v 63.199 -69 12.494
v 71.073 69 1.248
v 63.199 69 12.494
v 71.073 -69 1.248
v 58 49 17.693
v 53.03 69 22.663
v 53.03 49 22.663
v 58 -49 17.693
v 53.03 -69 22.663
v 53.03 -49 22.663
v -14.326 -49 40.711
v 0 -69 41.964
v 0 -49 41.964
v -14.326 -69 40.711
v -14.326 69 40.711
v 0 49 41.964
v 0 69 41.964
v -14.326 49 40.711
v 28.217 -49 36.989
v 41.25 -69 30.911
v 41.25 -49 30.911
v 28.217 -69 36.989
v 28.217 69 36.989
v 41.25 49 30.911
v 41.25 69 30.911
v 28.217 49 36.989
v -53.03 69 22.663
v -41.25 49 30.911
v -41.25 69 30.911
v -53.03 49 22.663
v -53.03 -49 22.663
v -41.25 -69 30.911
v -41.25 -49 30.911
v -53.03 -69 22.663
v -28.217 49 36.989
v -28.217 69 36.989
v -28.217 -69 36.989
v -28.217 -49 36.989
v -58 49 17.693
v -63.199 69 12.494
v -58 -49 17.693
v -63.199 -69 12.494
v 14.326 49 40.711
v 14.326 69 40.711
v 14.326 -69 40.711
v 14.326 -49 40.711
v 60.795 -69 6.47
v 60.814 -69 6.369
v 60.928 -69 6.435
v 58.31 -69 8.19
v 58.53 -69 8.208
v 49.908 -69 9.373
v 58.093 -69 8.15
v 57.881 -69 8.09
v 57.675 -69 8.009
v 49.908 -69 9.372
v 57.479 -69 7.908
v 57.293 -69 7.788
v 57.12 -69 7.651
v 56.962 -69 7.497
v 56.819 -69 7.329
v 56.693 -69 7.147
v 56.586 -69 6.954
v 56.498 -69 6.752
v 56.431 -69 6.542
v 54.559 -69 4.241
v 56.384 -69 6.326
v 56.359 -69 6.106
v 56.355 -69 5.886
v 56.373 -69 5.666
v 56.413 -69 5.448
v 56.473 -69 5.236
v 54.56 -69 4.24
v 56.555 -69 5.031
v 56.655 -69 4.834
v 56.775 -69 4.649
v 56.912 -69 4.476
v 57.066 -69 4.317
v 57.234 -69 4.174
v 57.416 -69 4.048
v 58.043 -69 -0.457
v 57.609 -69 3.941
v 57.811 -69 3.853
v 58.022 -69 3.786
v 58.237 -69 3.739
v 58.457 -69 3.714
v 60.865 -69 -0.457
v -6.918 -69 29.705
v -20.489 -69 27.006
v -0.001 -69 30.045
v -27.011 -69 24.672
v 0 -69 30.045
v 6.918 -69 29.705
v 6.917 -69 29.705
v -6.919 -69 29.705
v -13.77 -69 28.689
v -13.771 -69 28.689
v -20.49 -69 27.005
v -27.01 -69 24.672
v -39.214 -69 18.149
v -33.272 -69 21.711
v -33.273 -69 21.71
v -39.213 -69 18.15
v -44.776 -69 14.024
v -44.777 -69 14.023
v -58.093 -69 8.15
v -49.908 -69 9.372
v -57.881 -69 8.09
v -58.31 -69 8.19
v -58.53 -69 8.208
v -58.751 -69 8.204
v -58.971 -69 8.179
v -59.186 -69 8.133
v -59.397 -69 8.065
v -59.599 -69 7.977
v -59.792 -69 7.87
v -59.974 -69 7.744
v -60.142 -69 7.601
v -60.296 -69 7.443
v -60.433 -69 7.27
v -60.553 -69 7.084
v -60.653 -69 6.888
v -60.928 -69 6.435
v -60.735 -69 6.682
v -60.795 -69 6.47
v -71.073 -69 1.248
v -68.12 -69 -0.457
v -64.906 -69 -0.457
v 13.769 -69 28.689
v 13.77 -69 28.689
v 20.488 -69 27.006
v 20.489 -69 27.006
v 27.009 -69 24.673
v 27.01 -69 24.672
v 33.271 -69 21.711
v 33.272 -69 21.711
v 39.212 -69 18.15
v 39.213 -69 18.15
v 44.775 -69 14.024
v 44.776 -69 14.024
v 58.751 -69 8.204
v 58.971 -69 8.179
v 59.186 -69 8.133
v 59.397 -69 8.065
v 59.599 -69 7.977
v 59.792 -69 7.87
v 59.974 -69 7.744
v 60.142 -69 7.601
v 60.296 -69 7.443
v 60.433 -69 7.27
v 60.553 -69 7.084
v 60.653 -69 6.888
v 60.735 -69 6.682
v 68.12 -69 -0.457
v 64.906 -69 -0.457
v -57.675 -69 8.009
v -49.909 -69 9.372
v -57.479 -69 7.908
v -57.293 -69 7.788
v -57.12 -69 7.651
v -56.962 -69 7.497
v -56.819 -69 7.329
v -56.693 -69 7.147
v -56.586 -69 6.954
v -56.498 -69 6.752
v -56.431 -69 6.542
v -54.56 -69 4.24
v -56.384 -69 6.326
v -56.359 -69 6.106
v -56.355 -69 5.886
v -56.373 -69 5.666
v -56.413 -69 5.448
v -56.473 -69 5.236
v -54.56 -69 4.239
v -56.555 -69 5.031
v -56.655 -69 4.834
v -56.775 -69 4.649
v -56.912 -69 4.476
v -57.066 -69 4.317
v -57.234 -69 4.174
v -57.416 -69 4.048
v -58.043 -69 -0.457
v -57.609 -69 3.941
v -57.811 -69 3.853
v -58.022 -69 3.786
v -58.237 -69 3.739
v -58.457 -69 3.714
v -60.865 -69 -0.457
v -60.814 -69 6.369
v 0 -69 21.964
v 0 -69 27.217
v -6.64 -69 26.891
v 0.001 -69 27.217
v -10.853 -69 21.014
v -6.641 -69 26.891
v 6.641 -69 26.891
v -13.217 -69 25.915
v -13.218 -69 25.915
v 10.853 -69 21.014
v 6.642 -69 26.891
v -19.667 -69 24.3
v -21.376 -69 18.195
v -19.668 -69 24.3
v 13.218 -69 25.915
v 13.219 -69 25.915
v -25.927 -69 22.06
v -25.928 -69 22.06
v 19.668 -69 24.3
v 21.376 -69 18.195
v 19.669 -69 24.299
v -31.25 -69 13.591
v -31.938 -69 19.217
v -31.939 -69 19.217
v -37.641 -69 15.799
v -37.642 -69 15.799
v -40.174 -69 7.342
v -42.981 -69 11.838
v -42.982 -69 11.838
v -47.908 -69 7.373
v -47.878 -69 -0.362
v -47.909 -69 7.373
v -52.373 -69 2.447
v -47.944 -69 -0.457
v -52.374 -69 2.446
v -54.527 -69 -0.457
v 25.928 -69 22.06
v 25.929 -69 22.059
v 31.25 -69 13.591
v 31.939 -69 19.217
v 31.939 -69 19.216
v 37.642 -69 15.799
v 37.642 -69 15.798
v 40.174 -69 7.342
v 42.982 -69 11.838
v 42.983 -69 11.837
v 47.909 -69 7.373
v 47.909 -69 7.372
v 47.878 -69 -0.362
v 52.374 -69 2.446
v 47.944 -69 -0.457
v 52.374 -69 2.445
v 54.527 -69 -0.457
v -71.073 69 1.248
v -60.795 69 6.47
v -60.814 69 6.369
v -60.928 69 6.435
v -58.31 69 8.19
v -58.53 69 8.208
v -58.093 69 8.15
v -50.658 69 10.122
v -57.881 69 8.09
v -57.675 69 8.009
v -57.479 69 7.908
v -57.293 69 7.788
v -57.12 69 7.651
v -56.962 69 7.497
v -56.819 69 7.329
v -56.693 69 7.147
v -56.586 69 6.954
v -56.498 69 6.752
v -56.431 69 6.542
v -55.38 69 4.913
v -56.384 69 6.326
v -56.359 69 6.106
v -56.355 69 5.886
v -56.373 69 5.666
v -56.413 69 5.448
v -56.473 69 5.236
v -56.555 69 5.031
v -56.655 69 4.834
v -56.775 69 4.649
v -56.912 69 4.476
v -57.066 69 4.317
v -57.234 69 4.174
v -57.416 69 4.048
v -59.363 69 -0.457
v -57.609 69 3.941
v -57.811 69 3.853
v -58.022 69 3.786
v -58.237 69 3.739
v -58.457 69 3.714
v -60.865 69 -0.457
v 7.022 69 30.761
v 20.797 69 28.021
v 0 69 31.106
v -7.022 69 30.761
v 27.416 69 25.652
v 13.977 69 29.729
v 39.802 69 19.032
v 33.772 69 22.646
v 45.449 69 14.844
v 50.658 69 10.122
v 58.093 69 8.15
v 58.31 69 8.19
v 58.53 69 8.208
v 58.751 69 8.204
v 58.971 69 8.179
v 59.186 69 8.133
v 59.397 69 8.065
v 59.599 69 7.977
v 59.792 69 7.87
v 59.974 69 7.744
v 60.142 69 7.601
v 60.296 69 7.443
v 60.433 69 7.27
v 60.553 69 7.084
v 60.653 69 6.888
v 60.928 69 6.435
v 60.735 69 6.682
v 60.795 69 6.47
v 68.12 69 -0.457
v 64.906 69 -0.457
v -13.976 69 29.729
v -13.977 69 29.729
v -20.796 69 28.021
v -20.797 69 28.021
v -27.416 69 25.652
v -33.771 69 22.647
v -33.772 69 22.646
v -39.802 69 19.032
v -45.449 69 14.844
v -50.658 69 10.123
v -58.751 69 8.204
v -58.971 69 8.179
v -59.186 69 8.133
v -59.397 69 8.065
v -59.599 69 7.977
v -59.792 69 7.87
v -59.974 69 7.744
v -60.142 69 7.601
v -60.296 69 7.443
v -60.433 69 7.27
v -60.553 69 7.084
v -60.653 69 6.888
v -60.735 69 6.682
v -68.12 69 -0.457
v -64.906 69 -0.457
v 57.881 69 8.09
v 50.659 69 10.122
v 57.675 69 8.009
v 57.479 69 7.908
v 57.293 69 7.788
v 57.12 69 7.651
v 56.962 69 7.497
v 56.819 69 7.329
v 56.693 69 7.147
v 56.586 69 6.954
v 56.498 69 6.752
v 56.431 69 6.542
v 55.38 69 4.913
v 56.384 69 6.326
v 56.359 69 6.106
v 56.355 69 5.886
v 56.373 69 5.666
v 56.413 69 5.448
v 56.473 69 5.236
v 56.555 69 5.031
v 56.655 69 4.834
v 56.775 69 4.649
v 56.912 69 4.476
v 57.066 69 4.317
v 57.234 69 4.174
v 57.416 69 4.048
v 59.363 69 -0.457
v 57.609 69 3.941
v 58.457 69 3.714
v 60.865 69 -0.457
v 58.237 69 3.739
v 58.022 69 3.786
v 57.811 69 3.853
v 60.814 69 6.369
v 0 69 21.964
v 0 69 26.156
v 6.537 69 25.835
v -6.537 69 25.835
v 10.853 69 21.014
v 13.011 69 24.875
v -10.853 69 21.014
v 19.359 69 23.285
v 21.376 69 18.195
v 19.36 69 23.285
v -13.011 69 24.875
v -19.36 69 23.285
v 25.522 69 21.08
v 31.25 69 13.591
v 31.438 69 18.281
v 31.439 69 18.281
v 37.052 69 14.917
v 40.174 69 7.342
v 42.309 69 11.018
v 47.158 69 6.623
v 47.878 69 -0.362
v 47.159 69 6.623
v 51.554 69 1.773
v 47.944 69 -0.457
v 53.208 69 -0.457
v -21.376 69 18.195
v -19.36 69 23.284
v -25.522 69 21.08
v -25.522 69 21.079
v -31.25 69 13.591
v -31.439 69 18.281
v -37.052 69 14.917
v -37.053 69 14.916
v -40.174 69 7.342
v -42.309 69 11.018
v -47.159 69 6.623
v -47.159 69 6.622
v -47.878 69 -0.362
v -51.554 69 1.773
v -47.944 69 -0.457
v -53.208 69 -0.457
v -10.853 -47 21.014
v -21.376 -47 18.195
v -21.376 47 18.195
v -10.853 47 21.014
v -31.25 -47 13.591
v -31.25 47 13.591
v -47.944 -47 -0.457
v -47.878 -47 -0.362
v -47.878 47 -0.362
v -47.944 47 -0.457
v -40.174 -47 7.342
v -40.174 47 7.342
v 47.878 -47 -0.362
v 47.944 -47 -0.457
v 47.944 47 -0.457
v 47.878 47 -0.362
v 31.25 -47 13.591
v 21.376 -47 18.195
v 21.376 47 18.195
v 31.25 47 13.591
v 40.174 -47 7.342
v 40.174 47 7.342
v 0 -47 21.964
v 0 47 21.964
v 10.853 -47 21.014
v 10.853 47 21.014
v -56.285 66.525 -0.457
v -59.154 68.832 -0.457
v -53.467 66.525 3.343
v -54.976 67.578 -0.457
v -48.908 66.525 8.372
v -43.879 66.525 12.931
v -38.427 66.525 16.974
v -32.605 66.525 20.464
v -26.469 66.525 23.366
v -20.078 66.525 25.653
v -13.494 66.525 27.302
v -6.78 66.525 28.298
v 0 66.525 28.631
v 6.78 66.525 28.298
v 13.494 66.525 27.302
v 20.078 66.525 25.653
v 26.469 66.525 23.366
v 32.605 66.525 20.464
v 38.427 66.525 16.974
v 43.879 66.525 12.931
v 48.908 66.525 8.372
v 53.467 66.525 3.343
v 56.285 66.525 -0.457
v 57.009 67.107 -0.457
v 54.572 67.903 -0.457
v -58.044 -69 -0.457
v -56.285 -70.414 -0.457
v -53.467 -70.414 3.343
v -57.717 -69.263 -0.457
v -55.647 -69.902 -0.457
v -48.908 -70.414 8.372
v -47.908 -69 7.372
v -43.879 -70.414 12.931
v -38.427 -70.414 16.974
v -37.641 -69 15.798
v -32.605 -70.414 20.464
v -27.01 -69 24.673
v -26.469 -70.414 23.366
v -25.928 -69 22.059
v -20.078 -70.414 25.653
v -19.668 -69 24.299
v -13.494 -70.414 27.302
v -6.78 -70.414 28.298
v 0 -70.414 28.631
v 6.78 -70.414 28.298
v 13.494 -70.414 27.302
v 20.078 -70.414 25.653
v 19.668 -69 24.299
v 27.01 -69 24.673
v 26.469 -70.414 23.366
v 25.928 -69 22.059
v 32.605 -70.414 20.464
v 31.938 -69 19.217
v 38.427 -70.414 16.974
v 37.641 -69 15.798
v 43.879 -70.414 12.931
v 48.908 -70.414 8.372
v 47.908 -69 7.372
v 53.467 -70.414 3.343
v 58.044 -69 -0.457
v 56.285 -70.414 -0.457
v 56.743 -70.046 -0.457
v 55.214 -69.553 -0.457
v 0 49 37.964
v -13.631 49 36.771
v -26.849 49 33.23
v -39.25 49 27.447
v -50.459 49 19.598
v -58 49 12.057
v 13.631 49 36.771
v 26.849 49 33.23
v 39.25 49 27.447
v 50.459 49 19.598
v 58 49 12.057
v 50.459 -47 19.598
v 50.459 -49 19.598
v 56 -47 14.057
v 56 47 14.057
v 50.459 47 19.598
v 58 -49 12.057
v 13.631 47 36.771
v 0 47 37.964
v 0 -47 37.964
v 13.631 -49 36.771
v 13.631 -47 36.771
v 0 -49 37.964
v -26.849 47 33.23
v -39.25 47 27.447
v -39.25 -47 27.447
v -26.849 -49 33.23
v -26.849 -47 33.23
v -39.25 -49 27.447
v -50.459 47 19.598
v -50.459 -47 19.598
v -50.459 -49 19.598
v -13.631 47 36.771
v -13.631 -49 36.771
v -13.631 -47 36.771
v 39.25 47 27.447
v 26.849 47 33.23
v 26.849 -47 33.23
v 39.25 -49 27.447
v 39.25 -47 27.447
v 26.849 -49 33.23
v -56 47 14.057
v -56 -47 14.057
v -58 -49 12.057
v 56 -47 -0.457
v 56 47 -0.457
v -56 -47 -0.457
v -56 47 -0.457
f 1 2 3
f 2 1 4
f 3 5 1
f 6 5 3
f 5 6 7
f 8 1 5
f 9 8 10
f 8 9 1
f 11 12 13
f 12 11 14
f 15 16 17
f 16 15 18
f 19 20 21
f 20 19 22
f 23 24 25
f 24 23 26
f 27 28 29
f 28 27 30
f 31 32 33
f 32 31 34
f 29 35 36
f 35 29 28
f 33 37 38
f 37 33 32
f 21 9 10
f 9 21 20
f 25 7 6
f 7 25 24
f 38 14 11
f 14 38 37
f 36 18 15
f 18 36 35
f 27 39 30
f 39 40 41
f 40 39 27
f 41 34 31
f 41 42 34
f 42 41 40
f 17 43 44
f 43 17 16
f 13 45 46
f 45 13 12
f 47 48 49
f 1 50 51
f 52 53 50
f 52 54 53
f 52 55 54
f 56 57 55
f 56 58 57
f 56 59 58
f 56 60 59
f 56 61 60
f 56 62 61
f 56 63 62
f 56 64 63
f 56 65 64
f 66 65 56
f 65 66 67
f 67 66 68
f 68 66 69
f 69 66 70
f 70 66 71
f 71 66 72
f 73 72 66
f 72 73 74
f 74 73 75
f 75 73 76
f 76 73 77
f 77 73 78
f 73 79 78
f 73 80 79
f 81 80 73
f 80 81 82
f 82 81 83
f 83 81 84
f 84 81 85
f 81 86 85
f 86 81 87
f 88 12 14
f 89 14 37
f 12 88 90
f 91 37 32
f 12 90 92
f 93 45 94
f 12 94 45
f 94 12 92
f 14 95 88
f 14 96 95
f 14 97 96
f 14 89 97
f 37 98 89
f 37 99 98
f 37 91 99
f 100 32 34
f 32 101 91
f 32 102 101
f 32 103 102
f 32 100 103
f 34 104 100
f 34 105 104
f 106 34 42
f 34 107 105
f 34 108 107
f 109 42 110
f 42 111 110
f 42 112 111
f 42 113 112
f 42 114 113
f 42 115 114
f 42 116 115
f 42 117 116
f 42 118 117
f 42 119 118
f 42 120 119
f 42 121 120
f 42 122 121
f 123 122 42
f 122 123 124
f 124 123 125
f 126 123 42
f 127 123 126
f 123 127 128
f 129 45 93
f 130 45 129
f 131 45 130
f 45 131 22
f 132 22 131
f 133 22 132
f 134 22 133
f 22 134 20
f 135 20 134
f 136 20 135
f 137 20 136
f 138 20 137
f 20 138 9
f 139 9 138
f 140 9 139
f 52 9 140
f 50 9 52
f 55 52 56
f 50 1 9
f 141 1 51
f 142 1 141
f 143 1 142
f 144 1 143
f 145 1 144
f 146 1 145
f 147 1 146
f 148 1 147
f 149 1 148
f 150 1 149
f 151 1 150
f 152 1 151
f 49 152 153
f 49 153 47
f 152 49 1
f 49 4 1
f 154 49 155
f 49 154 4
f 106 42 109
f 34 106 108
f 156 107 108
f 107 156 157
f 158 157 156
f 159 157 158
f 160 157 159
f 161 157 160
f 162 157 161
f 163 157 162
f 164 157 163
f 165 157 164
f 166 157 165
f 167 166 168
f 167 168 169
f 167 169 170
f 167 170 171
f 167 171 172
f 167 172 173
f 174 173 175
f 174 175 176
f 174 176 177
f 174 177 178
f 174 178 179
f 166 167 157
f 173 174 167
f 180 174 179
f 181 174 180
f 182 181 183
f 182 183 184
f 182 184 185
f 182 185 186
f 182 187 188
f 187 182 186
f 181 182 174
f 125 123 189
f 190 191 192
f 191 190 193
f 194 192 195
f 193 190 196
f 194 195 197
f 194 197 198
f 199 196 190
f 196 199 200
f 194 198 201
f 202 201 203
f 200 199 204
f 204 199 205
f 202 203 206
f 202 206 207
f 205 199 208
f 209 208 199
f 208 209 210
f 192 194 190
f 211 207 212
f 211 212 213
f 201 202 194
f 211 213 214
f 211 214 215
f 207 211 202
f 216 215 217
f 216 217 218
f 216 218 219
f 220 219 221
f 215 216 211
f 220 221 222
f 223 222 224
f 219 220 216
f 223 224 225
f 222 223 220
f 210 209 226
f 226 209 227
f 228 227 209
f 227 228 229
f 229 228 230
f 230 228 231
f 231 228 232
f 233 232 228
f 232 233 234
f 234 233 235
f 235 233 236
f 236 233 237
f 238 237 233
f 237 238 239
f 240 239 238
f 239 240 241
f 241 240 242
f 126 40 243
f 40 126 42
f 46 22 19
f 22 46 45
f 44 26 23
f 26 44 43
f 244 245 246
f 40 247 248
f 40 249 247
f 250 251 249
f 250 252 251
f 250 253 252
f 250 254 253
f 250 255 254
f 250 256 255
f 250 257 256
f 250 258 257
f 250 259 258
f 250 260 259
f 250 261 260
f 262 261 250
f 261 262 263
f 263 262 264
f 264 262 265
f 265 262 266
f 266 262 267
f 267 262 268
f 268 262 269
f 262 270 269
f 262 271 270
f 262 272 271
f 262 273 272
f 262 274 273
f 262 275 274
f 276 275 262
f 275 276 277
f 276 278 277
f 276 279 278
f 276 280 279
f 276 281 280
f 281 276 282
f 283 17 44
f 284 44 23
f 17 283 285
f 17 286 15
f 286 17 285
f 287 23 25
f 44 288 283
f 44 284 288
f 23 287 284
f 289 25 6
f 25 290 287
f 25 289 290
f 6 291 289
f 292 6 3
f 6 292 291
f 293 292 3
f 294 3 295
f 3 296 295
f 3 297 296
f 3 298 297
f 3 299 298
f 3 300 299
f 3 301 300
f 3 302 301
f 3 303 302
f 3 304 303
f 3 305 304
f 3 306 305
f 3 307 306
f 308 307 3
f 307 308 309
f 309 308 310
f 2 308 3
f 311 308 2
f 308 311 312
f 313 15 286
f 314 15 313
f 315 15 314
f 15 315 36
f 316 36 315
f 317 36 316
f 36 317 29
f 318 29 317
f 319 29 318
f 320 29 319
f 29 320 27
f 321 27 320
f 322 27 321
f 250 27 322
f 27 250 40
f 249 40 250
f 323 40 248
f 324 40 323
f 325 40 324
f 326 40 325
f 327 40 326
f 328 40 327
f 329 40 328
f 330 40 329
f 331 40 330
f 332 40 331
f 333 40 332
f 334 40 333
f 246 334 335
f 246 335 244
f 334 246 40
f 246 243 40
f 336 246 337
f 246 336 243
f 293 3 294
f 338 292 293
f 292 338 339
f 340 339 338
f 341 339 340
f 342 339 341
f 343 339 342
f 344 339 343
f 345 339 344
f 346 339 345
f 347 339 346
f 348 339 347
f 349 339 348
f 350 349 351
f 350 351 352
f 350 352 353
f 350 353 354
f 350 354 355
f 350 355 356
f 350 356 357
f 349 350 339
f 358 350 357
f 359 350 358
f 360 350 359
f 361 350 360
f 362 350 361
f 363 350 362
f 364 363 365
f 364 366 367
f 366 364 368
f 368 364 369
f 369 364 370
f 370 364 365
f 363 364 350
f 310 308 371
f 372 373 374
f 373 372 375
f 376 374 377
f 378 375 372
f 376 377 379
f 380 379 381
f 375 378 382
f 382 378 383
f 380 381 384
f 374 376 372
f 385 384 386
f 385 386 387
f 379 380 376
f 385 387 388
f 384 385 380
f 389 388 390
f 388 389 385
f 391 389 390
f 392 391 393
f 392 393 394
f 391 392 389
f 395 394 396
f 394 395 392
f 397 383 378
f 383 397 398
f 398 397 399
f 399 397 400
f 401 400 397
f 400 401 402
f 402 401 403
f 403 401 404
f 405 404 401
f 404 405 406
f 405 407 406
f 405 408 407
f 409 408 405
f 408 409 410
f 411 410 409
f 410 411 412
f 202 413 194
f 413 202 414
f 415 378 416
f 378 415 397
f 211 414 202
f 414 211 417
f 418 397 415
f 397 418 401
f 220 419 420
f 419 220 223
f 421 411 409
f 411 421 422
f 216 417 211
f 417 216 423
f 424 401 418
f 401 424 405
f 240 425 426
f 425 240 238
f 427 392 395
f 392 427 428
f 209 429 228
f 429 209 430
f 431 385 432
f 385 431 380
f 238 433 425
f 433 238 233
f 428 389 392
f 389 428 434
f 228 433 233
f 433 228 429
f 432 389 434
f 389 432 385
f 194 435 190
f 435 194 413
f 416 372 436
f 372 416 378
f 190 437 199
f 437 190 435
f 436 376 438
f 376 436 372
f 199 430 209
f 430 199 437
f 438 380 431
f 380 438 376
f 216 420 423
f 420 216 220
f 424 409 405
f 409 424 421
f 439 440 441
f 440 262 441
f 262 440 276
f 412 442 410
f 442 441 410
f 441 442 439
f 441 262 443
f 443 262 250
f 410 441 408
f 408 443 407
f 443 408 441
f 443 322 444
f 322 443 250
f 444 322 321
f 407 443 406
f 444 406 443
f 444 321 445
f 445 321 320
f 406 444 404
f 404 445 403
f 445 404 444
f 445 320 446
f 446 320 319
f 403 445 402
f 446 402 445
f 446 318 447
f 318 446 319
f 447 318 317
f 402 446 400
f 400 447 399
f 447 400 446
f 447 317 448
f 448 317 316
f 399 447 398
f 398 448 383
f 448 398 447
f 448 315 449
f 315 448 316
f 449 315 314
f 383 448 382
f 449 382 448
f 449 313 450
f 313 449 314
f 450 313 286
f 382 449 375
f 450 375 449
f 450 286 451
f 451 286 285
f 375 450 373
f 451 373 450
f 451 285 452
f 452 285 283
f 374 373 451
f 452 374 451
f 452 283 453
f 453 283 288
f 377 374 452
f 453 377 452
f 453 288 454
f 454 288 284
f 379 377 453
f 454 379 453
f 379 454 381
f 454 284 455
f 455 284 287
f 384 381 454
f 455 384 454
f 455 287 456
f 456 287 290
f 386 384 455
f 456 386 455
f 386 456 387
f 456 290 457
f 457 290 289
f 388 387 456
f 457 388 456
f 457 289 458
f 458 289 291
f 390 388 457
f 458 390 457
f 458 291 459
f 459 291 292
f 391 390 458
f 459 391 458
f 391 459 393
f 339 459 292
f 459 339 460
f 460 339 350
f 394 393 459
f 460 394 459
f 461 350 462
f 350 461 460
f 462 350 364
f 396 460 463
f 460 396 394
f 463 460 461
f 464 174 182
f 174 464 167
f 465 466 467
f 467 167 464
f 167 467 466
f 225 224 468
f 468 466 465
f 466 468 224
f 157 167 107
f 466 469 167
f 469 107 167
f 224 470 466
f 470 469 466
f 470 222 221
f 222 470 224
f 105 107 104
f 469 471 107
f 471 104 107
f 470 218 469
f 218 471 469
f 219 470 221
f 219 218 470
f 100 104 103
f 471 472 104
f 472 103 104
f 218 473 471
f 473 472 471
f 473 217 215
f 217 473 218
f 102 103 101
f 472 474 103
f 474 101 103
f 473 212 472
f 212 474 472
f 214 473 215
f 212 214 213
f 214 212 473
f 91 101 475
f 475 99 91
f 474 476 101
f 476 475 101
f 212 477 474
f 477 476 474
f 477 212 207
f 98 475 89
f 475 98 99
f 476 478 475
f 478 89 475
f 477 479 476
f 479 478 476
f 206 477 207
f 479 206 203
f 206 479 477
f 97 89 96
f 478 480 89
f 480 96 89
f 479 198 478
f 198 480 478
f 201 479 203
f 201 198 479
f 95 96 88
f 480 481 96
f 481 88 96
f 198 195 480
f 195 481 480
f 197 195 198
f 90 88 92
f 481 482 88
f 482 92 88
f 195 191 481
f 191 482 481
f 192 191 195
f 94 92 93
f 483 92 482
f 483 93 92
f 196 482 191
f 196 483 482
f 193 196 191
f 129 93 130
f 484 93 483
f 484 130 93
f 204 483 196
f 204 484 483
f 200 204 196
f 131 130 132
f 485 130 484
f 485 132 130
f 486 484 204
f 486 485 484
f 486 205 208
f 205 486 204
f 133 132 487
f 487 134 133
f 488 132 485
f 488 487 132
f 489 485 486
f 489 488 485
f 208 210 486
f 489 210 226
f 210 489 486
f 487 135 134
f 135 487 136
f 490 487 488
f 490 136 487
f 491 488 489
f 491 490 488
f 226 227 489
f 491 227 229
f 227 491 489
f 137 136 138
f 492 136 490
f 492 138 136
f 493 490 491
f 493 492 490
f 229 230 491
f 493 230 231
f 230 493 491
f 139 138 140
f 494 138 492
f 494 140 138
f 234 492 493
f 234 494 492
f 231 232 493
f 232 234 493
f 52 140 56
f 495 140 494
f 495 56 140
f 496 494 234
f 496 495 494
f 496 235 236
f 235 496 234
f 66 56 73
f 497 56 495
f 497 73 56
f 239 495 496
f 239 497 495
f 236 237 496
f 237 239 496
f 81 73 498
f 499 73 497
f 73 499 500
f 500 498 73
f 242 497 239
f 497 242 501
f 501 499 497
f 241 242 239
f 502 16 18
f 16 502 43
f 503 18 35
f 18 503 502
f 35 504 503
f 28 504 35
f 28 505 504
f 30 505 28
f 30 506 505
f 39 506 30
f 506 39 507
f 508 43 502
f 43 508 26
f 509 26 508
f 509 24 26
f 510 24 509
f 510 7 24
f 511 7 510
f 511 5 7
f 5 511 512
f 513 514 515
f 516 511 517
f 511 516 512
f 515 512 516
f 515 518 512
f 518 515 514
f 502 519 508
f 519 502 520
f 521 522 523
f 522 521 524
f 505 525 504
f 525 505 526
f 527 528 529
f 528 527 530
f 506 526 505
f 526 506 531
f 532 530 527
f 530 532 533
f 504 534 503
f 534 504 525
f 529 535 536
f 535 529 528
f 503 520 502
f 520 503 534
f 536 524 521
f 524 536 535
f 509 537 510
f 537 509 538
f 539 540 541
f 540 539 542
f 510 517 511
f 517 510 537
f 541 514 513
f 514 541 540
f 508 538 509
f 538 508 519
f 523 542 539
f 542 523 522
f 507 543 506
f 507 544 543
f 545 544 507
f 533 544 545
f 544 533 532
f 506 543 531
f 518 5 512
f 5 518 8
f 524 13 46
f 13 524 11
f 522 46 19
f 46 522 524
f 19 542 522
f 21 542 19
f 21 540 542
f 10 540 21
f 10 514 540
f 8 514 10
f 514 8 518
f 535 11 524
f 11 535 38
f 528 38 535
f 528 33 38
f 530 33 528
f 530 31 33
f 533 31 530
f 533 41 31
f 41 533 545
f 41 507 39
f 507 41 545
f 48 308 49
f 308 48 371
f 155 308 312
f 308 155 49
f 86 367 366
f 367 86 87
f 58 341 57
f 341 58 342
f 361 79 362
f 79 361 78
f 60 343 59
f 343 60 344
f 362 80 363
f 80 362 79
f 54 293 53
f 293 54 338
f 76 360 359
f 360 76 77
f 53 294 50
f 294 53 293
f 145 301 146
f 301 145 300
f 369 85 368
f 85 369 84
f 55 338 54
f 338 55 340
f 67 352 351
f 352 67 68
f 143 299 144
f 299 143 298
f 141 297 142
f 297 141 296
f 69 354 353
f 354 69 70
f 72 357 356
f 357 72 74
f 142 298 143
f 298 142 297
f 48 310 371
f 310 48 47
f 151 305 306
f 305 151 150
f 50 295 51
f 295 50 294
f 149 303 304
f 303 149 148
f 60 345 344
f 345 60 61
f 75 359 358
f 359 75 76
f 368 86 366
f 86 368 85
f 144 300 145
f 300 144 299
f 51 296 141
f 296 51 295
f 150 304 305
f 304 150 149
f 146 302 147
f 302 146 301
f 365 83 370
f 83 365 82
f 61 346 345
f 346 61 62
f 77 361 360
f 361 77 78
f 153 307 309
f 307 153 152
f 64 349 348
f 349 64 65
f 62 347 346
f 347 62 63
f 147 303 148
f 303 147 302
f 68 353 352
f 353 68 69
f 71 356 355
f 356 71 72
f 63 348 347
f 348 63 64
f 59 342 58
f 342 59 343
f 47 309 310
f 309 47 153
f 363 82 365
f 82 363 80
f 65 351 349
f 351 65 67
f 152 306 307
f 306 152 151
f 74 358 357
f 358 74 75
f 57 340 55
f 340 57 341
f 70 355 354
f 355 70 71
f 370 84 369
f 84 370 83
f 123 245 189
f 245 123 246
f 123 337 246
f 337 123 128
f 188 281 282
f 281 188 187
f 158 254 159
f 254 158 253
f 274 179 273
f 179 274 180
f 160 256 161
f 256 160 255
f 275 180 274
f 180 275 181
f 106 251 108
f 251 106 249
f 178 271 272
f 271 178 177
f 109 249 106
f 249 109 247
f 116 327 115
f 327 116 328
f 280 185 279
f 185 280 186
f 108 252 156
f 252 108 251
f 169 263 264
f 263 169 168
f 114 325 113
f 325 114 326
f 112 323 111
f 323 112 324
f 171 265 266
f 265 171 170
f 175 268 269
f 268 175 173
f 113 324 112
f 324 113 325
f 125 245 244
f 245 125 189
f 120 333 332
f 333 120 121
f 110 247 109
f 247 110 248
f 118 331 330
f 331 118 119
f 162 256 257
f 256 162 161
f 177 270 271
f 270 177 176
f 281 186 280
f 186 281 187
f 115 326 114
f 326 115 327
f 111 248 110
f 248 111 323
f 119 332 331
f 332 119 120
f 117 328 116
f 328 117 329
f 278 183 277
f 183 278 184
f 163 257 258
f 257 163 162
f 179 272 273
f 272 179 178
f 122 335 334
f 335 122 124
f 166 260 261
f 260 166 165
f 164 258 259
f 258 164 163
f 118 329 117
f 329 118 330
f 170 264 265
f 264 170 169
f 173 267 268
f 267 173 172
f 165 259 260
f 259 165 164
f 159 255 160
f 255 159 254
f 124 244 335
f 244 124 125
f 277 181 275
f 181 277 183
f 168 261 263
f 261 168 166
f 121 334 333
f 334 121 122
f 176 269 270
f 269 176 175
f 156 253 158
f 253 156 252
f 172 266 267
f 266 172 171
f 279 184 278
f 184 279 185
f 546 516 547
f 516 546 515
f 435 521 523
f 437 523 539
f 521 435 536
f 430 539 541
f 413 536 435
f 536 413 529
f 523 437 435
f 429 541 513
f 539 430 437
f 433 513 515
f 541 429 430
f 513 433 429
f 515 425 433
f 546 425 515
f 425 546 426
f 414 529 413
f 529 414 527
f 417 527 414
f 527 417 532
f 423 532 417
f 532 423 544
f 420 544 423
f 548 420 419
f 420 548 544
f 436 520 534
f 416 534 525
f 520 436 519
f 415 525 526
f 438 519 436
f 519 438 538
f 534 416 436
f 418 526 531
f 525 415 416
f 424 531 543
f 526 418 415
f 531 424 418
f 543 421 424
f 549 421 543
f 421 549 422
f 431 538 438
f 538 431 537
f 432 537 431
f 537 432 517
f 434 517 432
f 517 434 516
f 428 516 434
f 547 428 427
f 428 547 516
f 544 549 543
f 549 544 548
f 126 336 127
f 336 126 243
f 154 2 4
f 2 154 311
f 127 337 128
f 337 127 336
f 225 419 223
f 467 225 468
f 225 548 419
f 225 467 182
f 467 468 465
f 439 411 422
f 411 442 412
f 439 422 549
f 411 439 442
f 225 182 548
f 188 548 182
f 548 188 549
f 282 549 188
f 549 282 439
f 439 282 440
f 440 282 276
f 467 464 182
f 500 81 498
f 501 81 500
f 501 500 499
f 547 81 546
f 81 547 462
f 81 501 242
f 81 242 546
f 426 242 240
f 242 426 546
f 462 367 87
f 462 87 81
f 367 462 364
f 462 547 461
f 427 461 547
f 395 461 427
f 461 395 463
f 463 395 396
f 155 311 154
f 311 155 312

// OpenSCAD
$fn=64;
translate(v = [0, 0, 41.964])
rotate(a = [90, 0, 0])
translate(v = [0, -82.500, -69.000])
difference(){union(){difference(){cylinder(h = 138, r = 82.500, $fn = 36);
translate(v = [0, 0, -0.010])
cylinder(h = 138.020, ifn = 36, r = 62.500, $fn = 36);
translate(v = [0, 0, -2.475])
rotate_extrude(){translate(v = [69.167, 0])
rotate(a = [0, 0, 45])
square(size = 3.500);
}
}
translate(v = [0, 0, 136.586])
rotate_extrude(){translate(v = [69.167, 0])
rotate(a = [0, 0, 45])
square(size = 2);
}
}
translate(v = [0, 27.500, 22])
translate(v = [-56.000, 0])
cube(size = [112, 55.000, 94.000]);
translate(v = [0, 0, 20])
intersection(){translate(v = [0, 47.500])
translate(v = [-58.000, 0])
cube(size = [116, 40.000, 98.000]);
difference(){cylinder(h = 99.000, r = 82.505, $fn = 36);
translate(v = [0, 0, -0.010])
cylinder(h = 99.020, ifn = 36, r = 78.500, $fn = 36);
}
}
translate(v = [0, 0.750, -0.500])
linear_extrude(height = 141){translate(v = [-82.500, 0])
polygon(points = [[0, 0], [82.500, 0.000], [0, 47.631], [0, 0]]);
}
translate(v = [0, 0.750, -0.500])
linear_extrude(height = 141){translate(v = [82.500, 0])
mirror(v = [1, 0])
polygon(points = [[0, 0], [82.500, 0.000], [0, 47.631], [0, 0]]);
}
translate(v = [62.787, 40.250, -0.500])
rotate(a = [0, 0, -60])
union(){translate(v = [-2, 0])
translate(v = [-4.750, -1.750])
cube(size = [9.500, 3.500, 139]);
translate(v = [-7.500, -0.500])
cylinder(h = 139, r = 2.250);
}
mirror(v = [1, 0])
translate(v = [62.787, 40.250, -0.500])
rotate(a = [0, 0, -60])
union(){translate(v = [-2, 0])
translate(v = [-4.750, -1.750])
cube(size = [9.500, 3.500, 139]);
translate(v = [-7.500, -0.500])
cylinder(h = 139, r = 2.250);
}
translate(v = [0, -42.421, -0.500])
translate(v = [-83.500, -82.500])
cube(size = [167, 165, 143.000]);
}
